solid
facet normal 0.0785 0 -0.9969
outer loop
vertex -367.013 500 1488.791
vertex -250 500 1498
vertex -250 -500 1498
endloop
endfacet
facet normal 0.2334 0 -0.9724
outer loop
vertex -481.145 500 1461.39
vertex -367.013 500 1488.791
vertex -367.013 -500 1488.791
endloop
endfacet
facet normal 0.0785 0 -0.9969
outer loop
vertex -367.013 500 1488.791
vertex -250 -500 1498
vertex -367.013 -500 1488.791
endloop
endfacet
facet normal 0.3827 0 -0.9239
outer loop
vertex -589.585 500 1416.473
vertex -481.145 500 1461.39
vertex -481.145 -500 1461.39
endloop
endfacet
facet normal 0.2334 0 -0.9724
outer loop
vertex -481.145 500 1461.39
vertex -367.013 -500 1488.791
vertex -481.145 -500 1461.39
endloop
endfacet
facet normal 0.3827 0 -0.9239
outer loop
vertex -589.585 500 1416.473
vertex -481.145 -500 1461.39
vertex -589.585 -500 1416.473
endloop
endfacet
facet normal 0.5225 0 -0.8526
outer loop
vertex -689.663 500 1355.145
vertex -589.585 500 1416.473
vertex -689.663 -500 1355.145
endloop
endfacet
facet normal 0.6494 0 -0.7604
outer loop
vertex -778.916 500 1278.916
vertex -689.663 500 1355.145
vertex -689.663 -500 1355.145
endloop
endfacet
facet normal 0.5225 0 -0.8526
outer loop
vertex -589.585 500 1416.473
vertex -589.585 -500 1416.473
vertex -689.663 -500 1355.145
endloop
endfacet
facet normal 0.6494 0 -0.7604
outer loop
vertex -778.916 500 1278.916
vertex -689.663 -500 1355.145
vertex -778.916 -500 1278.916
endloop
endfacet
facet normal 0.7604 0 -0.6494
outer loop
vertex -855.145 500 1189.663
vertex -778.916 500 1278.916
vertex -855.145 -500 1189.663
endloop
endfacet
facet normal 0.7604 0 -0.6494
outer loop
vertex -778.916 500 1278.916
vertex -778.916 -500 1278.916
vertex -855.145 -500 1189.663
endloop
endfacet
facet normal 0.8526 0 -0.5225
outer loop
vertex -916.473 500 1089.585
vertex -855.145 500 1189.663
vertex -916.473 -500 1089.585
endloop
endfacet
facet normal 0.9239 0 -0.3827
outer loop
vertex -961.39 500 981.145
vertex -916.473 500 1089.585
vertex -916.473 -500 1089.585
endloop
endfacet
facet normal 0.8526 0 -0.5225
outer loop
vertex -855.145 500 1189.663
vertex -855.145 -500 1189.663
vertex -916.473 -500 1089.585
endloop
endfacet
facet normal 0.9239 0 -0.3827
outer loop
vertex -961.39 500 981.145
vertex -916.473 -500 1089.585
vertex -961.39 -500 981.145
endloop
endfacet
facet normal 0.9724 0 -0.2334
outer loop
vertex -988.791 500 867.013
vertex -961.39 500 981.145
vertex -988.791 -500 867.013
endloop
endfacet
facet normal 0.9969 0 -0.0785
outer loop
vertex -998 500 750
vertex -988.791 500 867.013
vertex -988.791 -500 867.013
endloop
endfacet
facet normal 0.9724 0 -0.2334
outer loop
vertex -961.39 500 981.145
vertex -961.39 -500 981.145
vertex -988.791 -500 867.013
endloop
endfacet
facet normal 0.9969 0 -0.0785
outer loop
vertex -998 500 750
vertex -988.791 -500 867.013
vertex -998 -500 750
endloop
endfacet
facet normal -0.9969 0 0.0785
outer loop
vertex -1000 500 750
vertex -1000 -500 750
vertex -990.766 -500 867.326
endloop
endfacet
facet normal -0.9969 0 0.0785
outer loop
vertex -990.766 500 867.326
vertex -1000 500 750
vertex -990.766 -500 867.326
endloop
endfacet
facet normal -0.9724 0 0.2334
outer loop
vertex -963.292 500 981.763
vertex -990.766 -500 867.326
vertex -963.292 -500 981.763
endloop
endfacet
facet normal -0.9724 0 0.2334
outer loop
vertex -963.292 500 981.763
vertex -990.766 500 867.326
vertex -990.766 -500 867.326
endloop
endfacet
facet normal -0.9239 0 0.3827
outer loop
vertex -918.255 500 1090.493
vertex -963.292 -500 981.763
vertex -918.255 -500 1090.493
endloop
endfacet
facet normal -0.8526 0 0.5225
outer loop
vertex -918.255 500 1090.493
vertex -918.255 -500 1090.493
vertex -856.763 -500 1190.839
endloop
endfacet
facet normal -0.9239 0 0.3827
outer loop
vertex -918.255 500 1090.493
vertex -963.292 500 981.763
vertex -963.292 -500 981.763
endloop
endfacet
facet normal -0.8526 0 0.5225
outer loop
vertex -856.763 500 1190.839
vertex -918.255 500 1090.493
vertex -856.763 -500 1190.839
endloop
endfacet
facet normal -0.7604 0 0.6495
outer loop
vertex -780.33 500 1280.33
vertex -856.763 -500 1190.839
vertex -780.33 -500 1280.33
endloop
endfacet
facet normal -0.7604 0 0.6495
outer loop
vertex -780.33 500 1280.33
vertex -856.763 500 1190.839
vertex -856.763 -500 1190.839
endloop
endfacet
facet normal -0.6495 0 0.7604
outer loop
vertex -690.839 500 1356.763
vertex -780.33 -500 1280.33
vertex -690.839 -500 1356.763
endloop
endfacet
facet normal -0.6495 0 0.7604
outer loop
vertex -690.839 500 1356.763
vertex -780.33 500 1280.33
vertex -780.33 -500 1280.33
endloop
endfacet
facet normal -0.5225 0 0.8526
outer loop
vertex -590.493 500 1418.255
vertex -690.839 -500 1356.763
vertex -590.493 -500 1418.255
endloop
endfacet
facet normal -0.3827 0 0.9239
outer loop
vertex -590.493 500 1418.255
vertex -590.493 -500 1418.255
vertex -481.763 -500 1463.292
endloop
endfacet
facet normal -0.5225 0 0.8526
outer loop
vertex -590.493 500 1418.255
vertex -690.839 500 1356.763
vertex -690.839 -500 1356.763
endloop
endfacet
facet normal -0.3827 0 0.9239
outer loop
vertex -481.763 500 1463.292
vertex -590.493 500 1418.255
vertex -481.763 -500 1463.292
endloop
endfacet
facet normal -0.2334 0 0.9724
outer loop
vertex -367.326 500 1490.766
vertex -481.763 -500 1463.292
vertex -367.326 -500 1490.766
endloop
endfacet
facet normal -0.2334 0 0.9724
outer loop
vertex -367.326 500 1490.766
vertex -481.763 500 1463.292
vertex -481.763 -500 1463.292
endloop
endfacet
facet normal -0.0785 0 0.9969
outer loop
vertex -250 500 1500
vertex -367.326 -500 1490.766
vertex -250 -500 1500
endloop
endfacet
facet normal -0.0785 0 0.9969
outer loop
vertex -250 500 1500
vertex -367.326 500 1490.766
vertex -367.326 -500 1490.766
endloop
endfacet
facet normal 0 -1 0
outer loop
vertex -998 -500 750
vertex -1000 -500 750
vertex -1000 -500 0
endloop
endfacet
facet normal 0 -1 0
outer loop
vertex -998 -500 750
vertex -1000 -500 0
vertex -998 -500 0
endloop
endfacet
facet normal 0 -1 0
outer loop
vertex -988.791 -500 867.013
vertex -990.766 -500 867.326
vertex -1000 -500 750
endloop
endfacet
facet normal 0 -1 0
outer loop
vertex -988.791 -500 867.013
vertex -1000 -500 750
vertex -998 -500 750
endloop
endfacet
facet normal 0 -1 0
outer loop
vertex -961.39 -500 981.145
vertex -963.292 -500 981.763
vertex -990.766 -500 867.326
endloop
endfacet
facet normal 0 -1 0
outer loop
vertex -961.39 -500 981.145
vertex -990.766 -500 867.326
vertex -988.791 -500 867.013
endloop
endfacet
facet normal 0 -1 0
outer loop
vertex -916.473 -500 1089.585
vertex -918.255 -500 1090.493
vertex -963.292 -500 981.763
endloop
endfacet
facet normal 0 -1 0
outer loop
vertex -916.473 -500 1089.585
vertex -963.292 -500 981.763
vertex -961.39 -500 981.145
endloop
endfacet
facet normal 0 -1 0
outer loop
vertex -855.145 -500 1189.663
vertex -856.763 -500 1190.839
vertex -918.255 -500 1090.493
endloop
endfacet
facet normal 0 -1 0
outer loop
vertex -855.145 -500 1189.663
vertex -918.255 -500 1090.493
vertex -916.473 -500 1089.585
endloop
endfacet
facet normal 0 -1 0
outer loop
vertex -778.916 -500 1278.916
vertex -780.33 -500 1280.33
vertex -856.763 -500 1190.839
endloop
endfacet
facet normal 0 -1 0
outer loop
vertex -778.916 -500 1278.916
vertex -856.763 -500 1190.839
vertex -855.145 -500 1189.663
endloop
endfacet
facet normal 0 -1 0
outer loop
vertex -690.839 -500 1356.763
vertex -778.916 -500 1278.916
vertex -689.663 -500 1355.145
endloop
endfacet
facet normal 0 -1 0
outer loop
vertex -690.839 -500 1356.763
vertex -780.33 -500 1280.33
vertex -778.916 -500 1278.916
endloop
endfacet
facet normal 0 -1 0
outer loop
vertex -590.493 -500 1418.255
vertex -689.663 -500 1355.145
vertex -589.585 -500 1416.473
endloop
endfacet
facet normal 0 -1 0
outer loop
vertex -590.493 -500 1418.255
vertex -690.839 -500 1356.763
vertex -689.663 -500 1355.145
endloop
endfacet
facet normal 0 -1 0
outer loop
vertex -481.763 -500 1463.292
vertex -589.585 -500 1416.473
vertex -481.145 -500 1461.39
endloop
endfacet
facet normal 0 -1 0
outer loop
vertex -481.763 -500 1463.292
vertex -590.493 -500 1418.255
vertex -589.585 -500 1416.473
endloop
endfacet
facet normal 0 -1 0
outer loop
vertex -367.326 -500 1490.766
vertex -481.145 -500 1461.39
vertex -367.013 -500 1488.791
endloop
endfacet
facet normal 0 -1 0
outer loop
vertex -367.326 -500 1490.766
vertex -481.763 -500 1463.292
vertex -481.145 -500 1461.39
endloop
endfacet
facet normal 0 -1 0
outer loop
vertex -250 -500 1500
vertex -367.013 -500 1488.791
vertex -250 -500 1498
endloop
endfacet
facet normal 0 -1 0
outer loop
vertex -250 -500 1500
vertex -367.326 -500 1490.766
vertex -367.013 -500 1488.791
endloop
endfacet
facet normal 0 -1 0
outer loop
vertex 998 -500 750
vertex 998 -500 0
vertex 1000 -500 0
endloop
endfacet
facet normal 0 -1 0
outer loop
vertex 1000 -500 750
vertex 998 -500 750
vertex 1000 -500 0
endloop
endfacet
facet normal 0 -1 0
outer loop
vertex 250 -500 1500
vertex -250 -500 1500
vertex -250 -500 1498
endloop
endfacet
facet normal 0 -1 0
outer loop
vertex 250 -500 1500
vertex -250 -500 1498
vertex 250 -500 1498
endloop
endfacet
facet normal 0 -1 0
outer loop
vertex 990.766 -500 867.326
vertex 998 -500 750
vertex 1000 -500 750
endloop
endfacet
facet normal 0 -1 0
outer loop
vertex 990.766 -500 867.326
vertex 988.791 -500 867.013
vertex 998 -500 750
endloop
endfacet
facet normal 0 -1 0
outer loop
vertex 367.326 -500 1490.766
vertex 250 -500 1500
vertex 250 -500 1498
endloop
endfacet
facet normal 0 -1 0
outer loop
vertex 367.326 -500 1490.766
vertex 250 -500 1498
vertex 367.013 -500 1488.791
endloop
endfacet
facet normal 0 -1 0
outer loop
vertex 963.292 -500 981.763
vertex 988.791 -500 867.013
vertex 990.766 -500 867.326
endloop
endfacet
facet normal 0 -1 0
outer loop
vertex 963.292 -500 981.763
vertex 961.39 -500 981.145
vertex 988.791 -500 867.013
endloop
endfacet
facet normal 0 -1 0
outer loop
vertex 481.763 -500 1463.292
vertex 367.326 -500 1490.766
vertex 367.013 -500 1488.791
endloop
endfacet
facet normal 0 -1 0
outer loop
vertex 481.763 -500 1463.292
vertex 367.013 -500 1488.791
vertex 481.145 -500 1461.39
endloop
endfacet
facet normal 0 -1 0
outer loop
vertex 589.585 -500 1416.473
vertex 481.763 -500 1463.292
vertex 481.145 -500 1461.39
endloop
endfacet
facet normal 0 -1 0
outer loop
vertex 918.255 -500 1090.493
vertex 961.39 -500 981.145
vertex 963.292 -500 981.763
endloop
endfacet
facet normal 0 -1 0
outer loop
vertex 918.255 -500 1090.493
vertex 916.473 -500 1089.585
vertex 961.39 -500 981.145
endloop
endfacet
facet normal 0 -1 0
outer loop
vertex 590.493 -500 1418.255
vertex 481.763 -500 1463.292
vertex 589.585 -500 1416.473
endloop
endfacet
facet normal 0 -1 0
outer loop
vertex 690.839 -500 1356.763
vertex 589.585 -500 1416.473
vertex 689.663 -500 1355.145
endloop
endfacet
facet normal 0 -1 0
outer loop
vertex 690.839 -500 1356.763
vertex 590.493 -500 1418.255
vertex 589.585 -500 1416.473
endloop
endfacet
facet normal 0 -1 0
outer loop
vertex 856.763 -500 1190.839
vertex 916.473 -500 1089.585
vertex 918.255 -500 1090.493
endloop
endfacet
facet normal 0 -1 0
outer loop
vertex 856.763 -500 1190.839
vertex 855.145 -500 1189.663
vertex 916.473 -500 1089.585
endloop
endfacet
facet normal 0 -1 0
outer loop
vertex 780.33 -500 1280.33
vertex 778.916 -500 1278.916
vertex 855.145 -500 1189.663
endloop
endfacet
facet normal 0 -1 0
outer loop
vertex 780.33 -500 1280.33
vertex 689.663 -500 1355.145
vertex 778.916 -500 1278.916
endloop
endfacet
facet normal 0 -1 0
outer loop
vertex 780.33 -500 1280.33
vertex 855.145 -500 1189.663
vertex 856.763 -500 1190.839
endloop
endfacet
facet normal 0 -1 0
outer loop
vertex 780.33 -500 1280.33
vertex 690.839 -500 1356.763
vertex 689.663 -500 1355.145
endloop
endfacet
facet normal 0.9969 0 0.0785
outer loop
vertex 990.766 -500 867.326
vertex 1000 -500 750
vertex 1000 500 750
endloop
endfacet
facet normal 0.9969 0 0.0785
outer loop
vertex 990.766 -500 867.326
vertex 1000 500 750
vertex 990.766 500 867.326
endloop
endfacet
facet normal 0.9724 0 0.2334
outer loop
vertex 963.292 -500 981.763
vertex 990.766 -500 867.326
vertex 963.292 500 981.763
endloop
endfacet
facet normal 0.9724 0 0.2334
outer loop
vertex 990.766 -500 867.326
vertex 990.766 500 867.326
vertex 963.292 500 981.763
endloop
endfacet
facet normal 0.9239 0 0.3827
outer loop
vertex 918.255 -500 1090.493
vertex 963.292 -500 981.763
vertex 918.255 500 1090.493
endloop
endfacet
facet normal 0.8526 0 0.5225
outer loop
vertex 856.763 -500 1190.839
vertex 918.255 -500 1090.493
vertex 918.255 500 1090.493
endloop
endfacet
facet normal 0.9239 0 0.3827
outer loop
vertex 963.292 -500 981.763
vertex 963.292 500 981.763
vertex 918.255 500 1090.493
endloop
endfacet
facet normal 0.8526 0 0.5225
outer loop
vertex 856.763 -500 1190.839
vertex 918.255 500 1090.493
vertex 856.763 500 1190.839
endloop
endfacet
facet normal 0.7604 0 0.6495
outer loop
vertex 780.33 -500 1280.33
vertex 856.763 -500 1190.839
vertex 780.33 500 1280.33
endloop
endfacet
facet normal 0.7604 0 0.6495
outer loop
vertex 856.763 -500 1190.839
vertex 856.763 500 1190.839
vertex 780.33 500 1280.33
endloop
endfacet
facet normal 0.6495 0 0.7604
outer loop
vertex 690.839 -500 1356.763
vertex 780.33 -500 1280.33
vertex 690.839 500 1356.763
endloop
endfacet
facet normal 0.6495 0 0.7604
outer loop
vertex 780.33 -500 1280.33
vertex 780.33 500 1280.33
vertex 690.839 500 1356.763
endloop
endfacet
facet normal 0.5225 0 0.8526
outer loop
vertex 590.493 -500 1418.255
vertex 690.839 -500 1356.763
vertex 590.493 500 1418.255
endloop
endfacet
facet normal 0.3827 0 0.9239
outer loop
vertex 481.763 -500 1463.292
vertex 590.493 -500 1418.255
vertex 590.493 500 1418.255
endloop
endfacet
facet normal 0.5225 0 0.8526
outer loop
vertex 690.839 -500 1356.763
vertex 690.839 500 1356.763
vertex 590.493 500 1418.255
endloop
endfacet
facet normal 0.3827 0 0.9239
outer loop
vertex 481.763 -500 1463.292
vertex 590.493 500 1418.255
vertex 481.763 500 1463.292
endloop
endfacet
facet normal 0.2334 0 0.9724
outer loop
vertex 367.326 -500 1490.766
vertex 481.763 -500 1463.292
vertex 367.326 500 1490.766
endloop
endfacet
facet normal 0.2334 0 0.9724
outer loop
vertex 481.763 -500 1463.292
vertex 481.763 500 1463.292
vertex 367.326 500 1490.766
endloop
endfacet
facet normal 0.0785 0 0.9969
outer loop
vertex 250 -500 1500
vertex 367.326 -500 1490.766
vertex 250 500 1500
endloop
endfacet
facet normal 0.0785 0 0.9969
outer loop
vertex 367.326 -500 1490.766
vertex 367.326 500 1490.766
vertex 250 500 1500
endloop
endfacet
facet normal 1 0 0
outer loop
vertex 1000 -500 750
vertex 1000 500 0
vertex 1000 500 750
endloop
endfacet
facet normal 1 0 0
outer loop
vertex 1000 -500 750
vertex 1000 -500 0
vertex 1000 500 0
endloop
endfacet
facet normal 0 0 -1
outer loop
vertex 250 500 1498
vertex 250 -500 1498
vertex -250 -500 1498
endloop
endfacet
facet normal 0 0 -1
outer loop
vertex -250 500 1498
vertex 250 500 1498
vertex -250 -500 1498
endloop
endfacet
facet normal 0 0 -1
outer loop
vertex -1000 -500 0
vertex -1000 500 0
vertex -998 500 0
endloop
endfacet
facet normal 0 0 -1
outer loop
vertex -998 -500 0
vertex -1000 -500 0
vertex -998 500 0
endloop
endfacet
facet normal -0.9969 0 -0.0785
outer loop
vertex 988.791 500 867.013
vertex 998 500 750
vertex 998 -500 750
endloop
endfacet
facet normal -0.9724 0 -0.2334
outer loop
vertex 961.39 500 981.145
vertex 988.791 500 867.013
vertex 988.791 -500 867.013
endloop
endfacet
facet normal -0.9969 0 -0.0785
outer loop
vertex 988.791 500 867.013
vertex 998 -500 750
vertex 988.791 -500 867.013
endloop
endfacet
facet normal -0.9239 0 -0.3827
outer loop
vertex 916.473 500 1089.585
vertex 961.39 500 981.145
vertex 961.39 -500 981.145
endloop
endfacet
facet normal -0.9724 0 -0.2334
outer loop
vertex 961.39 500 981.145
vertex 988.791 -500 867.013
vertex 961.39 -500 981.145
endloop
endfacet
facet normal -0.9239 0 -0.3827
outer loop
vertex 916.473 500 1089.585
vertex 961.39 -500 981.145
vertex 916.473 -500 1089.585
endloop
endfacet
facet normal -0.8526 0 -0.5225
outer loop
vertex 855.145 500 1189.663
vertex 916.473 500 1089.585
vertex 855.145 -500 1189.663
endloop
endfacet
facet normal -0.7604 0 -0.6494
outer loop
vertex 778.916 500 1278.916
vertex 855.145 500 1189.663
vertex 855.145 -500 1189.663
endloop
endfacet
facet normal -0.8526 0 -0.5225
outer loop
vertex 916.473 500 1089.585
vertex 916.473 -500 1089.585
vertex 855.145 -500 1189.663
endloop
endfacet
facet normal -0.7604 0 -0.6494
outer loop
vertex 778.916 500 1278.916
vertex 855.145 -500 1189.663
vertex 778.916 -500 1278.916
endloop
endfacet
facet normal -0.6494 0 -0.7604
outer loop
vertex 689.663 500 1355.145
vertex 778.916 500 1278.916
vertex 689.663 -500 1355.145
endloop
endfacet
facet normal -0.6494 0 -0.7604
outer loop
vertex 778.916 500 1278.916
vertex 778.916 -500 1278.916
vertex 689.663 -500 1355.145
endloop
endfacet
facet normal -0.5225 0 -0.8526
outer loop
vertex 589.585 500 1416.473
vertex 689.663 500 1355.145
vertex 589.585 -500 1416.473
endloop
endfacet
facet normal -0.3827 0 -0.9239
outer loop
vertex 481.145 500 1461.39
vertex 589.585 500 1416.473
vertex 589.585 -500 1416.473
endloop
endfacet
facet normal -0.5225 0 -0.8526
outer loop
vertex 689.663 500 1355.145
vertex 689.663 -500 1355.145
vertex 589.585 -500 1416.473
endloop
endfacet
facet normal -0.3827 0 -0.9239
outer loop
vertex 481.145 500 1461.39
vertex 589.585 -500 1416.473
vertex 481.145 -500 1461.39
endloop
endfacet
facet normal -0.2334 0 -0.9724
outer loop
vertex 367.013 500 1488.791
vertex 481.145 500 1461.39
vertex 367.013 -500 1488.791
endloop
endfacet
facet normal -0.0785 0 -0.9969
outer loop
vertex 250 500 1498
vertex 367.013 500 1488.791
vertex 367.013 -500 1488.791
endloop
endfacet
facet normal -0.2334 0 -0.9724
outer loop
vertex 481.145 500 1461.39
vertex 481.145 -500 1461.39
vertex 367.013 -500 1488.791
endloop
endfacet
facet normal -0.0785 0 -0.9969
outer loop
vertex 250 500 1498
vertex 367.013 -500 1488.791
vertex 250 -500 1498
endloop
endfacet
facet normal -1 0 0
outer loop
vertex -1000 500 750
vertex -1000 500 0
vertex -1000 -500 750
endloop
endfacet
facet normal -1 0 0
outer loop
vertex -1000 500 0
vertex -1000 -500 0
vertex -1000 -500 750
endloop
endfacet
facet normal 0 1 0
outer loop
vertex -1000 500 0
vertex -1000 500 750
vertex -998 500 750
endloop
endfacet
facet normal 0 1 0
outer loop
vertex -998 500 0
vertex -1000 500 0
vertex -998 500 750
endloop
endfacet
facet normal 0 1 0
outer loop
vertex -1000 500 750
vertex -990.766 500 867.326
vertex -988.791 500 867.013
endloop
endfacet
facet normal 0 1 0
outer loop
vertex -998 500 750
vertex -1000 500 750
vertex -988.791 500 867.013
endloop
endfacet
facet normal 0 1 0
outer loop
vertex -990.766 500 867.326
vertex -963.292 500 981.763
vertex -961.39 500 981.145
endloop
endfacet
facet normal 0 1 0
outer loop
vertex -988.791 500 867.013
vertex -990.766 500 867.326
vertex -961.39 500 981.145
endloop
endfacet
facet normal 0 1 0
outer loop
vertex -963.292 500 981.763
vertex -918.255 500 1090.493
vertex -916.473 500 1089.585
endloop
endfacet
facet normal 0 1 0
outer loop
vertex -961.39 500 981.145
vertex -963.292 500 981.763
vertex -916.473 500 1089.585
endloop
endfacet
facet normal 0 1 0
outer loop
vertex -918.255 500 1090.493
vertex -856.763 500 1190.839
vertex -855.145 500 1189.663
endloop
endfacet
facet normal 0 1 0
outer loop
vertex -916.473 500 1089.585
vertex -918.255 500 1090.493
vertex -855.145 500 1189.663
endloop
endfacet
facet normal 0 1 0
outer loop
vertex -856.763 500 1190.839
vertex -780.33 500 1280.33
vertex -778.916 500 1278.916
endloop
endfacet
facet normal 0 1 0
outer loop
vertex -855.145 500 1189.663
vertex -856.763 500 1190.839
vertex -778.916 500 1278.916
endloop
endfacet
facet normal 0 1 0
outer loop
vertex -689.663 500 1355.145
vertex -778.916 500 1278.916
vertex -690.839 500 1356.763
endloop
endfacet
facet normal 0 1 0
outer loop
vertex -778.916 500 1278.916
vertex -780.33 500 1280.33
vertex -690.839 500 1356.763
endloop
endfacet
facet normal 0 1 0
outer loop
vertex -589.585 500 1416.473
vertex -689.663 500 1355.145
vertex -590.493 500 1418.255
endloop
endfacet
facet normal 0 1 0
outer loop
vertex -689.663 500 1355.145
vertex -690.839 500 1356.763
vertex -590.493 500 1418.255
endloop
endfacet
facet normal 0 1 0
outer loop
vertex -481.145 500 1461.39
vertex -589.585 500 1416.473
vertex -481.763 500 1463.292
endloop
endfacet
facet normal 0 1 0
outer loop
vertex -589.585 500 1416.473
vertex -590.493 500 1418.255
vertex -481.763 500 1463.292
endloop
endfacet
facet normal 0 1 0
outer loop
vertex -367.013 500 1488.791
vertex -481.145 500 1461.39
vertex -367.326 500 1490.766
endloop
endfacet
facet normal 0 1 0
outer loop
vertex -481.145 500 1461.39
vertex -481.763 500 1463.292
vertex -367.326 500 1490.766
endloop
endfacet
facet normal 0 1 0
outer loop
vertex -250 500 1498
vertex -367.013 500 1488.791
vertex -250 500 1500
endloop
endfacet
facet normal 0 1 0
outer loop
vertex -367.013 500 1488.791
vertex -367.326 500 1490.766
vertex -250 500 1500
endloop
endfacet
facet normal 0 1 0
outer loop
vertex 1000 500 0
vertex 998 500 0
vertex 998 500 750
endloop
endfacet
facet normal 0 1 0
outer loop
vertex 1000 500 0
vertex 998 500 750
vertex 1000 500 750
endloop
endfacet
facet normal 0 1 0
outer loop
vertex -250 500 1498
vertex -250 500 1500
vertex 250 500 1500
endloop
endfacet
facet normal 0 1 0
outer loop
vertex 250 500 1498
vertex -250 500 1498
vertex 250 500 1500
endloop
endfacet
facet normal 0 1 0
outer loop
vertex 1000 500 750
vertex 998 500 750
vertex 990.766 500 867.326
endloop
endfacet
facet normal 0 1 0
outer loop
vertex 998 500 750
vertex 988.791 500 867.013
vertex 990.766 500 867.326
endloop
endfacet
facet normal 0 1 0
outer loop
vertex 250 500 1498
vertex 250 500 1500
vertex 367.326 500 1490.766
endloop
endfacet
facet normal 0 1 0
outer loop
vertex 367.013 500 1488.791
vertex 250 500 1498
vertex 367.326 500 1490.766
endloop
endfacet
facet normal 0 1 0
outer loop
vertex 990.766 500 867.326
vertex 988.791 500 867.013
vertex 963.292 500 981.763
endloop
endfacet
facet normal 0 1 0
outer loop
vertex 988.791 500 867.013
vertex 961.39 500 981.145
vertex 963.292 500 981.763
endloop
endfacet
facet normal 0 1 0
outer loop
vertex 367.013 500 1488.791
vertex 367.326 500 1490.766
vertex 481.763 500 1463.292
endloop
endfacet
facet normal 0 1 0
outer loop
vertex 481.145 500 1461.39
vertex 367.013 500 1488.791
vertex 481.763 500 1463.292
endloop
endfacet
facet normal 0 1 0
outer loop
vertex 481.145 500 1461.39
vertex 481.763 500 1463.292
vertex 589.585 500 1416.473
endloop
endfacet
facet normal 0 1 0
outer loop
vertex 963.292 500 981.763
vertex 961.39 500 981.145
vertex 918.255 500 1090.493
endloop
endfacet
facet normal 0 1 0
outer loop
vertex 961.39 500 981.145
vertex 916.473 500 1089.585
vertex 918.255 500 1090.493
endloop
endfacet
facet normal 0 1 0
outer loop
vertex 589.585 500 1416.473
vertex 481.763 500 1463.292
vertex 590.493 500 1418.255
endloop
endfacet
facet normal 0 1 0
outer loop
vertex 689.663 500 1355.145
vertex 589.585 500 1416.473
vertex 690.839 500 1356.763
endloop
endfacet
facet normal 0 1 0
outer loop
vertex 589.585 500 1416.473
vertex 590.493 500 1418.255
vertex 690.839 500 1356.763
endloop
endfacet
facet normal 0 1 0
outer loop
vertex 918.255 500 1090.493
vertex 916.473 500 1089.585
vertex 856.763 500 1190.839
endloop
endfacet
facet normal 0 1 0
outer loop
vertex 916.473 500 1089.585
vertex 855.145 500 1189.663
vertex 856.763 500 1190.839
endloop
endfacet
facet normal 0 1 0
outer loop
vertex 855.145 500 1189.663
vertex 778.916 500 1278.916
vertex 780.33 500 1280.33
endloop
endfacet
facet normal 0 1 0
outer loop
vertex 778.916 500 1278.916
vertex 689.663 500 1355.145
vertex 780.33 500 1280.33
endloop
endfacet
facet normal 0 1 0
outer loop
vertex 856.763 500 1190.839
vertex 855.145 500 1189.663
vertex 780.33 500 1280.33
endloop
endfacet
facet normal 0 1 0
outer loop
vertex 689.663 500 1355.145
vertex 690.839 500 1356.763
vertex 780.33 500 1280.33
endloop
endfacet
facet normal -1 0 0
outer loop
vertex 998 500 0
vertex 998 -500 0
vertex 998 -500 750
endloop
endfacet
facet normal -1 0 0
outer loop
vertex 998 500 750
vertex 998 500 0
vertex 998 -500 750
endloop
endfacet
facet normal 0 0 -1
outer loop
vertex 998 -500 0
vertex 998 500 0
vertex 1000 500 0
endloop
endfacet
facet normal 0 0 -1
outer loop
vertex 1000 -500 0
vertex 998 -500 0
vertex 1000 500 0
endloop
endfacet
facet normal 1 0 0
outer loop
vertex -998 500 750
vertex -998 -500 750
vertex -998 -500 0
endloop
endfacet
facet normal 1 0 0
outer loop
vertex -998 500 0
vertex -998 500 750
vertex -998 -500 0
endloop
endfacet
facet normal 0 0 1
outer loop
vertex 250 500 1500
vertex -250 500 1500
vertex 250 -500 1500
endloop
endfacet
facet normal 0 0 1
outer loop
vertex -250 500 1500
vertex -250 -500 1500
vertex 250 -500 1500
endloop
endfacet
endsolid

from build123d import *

# Parameters (mm, degrees)
F0_W     = 2000
F0_H     = 1500
F1_DEPTH = 500
F2_R     = 750
F4_DEPTH = 1000.001


# Not quite as in the source:
# - a feature names something its author has since deleted; it is built from what else it names


with BuildPart() as f1:
    # F0 (on Front) → F1 (new body, symmetric)
    with BuildSketch(Plane.XZ):
        with Locations((0, 750)):
            Rectangle(F0_W, F0_H)
    extrude(amount=F1_DEPTH, both=True)

    # F2
    f2_edges = [f1.edges().sort_by_distance(p)[0] for p in [
        (-1000, 0, 1500),
        (1000, 0, 1500),
    ]]
    fillet(f2_edges, radius=F2_R)

    # F3 (on face) → F4 (cut, through all)
    with BuildSketch(Plane.XZ.offset(500)):
        with BuildLine():
            ThreePointArc((-250, 1498), (-778.9158723275, 1278.9158723275), (-998, 750))
            Line((-998, 750), (-998, -0.5737363658))
            Line((-998, -0.5737363658), (998, -0.5742163858))
            Line((998, -0.5742163858), (998, 750))
            ThreePointArc((998, 750), (778.9158723275, 1278.9158723275), (250, 1498))
            Line((250, 1498), (-250, 1498))
        make_face()
    extrude(amount=-F4_DEPTH, mode=Mode.SUBTRACT)


solid = f1.part
